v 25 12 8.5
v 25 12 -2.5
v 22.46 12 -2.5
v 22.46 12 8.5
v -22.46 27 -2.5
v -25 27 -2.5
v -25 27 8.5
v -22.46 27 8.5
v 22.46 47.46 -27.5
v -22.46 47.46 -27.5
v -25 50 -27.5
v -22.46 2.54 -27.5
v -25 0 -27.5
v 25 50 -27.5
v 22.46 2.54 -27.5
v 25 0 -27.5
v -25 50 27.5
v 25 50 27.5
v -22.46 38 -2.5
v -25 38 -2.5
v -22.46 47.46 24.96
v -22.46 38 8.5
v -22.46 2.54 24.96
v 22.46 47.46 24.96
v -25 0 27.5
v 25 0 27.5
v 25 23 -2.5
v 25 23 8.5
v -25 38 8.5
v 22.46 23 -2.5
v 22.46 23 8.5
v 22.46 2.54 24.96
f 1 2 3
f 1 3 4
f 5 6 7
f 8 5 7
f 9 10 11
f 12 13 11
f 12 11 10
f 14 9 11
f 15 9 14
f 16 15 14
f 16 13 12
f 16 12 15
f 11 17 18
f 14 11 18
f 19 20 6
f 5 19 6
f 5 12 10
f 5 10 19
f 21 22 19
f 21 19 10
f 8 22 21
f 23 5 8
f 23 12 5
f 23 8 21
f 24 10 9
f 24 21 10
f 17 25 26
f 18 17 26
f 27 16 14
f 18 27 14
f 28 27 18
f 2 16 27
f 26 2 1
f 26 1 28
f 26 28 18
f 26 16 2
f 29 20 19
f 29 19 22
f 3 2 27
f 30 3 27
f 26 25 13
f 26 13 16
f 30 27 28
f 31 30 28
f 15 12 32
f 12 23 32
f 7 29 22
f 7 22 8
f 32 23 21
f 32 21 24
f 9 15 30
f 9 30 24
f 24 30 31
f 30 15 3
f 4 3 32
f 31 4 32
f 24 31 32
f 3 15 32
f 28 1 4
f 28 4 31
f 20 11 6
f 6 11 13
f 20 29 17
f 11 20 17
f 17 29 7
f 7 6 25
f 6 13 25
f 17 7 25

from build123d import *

# Parameters (mm, degrees)
F0_W     = 50
F0_H     = 55
F1_DEPTH = 50
F2_T     = -2.54
F3_W     = 11
F3_H     = 11
F4_DEPTH = 10
F5_W     = 11
F5_H     = 11
F6_DEPTH = 10


with BuildPart() as f1:
    # F0 (on Front) → F1 (new body)
    with BuildSketch(Plane.XZ):
        Rectangle(F0_W, F0_H)
    extrude(amount=-F1_DEPTH)

    # F2
    f2_openings = [f1.faces().sort_by_distance(p)[0] for p in [
        (0, 25, -27.5),
    ]]
    offset(amount=F2_T, openings=f2_openings)

    # F3 (on face) → F4 (cut)
    with BuildSketch(Plane(origin=(-25, 0, 0), x_dir=(0, -1, 0), z_dir=(-1, 0, 0))):
        with Locations((-32.5, 3)):
            Rectangle(F3_W, F3_H)
    extrude(amount=-F4_DEPTH, mode=Mode.SUBTRACT)

    # F5 (on face) → F6 (cut)
    with BuildSketch(Plane.YZ.offset(25)):
        with Locations((17.5, 3)):
            Rectangle(F5_W, F5_H)
    extrude(amount=-F6_DEPTH, mode=Mode.SUBTRACT)


solid = f1.part
